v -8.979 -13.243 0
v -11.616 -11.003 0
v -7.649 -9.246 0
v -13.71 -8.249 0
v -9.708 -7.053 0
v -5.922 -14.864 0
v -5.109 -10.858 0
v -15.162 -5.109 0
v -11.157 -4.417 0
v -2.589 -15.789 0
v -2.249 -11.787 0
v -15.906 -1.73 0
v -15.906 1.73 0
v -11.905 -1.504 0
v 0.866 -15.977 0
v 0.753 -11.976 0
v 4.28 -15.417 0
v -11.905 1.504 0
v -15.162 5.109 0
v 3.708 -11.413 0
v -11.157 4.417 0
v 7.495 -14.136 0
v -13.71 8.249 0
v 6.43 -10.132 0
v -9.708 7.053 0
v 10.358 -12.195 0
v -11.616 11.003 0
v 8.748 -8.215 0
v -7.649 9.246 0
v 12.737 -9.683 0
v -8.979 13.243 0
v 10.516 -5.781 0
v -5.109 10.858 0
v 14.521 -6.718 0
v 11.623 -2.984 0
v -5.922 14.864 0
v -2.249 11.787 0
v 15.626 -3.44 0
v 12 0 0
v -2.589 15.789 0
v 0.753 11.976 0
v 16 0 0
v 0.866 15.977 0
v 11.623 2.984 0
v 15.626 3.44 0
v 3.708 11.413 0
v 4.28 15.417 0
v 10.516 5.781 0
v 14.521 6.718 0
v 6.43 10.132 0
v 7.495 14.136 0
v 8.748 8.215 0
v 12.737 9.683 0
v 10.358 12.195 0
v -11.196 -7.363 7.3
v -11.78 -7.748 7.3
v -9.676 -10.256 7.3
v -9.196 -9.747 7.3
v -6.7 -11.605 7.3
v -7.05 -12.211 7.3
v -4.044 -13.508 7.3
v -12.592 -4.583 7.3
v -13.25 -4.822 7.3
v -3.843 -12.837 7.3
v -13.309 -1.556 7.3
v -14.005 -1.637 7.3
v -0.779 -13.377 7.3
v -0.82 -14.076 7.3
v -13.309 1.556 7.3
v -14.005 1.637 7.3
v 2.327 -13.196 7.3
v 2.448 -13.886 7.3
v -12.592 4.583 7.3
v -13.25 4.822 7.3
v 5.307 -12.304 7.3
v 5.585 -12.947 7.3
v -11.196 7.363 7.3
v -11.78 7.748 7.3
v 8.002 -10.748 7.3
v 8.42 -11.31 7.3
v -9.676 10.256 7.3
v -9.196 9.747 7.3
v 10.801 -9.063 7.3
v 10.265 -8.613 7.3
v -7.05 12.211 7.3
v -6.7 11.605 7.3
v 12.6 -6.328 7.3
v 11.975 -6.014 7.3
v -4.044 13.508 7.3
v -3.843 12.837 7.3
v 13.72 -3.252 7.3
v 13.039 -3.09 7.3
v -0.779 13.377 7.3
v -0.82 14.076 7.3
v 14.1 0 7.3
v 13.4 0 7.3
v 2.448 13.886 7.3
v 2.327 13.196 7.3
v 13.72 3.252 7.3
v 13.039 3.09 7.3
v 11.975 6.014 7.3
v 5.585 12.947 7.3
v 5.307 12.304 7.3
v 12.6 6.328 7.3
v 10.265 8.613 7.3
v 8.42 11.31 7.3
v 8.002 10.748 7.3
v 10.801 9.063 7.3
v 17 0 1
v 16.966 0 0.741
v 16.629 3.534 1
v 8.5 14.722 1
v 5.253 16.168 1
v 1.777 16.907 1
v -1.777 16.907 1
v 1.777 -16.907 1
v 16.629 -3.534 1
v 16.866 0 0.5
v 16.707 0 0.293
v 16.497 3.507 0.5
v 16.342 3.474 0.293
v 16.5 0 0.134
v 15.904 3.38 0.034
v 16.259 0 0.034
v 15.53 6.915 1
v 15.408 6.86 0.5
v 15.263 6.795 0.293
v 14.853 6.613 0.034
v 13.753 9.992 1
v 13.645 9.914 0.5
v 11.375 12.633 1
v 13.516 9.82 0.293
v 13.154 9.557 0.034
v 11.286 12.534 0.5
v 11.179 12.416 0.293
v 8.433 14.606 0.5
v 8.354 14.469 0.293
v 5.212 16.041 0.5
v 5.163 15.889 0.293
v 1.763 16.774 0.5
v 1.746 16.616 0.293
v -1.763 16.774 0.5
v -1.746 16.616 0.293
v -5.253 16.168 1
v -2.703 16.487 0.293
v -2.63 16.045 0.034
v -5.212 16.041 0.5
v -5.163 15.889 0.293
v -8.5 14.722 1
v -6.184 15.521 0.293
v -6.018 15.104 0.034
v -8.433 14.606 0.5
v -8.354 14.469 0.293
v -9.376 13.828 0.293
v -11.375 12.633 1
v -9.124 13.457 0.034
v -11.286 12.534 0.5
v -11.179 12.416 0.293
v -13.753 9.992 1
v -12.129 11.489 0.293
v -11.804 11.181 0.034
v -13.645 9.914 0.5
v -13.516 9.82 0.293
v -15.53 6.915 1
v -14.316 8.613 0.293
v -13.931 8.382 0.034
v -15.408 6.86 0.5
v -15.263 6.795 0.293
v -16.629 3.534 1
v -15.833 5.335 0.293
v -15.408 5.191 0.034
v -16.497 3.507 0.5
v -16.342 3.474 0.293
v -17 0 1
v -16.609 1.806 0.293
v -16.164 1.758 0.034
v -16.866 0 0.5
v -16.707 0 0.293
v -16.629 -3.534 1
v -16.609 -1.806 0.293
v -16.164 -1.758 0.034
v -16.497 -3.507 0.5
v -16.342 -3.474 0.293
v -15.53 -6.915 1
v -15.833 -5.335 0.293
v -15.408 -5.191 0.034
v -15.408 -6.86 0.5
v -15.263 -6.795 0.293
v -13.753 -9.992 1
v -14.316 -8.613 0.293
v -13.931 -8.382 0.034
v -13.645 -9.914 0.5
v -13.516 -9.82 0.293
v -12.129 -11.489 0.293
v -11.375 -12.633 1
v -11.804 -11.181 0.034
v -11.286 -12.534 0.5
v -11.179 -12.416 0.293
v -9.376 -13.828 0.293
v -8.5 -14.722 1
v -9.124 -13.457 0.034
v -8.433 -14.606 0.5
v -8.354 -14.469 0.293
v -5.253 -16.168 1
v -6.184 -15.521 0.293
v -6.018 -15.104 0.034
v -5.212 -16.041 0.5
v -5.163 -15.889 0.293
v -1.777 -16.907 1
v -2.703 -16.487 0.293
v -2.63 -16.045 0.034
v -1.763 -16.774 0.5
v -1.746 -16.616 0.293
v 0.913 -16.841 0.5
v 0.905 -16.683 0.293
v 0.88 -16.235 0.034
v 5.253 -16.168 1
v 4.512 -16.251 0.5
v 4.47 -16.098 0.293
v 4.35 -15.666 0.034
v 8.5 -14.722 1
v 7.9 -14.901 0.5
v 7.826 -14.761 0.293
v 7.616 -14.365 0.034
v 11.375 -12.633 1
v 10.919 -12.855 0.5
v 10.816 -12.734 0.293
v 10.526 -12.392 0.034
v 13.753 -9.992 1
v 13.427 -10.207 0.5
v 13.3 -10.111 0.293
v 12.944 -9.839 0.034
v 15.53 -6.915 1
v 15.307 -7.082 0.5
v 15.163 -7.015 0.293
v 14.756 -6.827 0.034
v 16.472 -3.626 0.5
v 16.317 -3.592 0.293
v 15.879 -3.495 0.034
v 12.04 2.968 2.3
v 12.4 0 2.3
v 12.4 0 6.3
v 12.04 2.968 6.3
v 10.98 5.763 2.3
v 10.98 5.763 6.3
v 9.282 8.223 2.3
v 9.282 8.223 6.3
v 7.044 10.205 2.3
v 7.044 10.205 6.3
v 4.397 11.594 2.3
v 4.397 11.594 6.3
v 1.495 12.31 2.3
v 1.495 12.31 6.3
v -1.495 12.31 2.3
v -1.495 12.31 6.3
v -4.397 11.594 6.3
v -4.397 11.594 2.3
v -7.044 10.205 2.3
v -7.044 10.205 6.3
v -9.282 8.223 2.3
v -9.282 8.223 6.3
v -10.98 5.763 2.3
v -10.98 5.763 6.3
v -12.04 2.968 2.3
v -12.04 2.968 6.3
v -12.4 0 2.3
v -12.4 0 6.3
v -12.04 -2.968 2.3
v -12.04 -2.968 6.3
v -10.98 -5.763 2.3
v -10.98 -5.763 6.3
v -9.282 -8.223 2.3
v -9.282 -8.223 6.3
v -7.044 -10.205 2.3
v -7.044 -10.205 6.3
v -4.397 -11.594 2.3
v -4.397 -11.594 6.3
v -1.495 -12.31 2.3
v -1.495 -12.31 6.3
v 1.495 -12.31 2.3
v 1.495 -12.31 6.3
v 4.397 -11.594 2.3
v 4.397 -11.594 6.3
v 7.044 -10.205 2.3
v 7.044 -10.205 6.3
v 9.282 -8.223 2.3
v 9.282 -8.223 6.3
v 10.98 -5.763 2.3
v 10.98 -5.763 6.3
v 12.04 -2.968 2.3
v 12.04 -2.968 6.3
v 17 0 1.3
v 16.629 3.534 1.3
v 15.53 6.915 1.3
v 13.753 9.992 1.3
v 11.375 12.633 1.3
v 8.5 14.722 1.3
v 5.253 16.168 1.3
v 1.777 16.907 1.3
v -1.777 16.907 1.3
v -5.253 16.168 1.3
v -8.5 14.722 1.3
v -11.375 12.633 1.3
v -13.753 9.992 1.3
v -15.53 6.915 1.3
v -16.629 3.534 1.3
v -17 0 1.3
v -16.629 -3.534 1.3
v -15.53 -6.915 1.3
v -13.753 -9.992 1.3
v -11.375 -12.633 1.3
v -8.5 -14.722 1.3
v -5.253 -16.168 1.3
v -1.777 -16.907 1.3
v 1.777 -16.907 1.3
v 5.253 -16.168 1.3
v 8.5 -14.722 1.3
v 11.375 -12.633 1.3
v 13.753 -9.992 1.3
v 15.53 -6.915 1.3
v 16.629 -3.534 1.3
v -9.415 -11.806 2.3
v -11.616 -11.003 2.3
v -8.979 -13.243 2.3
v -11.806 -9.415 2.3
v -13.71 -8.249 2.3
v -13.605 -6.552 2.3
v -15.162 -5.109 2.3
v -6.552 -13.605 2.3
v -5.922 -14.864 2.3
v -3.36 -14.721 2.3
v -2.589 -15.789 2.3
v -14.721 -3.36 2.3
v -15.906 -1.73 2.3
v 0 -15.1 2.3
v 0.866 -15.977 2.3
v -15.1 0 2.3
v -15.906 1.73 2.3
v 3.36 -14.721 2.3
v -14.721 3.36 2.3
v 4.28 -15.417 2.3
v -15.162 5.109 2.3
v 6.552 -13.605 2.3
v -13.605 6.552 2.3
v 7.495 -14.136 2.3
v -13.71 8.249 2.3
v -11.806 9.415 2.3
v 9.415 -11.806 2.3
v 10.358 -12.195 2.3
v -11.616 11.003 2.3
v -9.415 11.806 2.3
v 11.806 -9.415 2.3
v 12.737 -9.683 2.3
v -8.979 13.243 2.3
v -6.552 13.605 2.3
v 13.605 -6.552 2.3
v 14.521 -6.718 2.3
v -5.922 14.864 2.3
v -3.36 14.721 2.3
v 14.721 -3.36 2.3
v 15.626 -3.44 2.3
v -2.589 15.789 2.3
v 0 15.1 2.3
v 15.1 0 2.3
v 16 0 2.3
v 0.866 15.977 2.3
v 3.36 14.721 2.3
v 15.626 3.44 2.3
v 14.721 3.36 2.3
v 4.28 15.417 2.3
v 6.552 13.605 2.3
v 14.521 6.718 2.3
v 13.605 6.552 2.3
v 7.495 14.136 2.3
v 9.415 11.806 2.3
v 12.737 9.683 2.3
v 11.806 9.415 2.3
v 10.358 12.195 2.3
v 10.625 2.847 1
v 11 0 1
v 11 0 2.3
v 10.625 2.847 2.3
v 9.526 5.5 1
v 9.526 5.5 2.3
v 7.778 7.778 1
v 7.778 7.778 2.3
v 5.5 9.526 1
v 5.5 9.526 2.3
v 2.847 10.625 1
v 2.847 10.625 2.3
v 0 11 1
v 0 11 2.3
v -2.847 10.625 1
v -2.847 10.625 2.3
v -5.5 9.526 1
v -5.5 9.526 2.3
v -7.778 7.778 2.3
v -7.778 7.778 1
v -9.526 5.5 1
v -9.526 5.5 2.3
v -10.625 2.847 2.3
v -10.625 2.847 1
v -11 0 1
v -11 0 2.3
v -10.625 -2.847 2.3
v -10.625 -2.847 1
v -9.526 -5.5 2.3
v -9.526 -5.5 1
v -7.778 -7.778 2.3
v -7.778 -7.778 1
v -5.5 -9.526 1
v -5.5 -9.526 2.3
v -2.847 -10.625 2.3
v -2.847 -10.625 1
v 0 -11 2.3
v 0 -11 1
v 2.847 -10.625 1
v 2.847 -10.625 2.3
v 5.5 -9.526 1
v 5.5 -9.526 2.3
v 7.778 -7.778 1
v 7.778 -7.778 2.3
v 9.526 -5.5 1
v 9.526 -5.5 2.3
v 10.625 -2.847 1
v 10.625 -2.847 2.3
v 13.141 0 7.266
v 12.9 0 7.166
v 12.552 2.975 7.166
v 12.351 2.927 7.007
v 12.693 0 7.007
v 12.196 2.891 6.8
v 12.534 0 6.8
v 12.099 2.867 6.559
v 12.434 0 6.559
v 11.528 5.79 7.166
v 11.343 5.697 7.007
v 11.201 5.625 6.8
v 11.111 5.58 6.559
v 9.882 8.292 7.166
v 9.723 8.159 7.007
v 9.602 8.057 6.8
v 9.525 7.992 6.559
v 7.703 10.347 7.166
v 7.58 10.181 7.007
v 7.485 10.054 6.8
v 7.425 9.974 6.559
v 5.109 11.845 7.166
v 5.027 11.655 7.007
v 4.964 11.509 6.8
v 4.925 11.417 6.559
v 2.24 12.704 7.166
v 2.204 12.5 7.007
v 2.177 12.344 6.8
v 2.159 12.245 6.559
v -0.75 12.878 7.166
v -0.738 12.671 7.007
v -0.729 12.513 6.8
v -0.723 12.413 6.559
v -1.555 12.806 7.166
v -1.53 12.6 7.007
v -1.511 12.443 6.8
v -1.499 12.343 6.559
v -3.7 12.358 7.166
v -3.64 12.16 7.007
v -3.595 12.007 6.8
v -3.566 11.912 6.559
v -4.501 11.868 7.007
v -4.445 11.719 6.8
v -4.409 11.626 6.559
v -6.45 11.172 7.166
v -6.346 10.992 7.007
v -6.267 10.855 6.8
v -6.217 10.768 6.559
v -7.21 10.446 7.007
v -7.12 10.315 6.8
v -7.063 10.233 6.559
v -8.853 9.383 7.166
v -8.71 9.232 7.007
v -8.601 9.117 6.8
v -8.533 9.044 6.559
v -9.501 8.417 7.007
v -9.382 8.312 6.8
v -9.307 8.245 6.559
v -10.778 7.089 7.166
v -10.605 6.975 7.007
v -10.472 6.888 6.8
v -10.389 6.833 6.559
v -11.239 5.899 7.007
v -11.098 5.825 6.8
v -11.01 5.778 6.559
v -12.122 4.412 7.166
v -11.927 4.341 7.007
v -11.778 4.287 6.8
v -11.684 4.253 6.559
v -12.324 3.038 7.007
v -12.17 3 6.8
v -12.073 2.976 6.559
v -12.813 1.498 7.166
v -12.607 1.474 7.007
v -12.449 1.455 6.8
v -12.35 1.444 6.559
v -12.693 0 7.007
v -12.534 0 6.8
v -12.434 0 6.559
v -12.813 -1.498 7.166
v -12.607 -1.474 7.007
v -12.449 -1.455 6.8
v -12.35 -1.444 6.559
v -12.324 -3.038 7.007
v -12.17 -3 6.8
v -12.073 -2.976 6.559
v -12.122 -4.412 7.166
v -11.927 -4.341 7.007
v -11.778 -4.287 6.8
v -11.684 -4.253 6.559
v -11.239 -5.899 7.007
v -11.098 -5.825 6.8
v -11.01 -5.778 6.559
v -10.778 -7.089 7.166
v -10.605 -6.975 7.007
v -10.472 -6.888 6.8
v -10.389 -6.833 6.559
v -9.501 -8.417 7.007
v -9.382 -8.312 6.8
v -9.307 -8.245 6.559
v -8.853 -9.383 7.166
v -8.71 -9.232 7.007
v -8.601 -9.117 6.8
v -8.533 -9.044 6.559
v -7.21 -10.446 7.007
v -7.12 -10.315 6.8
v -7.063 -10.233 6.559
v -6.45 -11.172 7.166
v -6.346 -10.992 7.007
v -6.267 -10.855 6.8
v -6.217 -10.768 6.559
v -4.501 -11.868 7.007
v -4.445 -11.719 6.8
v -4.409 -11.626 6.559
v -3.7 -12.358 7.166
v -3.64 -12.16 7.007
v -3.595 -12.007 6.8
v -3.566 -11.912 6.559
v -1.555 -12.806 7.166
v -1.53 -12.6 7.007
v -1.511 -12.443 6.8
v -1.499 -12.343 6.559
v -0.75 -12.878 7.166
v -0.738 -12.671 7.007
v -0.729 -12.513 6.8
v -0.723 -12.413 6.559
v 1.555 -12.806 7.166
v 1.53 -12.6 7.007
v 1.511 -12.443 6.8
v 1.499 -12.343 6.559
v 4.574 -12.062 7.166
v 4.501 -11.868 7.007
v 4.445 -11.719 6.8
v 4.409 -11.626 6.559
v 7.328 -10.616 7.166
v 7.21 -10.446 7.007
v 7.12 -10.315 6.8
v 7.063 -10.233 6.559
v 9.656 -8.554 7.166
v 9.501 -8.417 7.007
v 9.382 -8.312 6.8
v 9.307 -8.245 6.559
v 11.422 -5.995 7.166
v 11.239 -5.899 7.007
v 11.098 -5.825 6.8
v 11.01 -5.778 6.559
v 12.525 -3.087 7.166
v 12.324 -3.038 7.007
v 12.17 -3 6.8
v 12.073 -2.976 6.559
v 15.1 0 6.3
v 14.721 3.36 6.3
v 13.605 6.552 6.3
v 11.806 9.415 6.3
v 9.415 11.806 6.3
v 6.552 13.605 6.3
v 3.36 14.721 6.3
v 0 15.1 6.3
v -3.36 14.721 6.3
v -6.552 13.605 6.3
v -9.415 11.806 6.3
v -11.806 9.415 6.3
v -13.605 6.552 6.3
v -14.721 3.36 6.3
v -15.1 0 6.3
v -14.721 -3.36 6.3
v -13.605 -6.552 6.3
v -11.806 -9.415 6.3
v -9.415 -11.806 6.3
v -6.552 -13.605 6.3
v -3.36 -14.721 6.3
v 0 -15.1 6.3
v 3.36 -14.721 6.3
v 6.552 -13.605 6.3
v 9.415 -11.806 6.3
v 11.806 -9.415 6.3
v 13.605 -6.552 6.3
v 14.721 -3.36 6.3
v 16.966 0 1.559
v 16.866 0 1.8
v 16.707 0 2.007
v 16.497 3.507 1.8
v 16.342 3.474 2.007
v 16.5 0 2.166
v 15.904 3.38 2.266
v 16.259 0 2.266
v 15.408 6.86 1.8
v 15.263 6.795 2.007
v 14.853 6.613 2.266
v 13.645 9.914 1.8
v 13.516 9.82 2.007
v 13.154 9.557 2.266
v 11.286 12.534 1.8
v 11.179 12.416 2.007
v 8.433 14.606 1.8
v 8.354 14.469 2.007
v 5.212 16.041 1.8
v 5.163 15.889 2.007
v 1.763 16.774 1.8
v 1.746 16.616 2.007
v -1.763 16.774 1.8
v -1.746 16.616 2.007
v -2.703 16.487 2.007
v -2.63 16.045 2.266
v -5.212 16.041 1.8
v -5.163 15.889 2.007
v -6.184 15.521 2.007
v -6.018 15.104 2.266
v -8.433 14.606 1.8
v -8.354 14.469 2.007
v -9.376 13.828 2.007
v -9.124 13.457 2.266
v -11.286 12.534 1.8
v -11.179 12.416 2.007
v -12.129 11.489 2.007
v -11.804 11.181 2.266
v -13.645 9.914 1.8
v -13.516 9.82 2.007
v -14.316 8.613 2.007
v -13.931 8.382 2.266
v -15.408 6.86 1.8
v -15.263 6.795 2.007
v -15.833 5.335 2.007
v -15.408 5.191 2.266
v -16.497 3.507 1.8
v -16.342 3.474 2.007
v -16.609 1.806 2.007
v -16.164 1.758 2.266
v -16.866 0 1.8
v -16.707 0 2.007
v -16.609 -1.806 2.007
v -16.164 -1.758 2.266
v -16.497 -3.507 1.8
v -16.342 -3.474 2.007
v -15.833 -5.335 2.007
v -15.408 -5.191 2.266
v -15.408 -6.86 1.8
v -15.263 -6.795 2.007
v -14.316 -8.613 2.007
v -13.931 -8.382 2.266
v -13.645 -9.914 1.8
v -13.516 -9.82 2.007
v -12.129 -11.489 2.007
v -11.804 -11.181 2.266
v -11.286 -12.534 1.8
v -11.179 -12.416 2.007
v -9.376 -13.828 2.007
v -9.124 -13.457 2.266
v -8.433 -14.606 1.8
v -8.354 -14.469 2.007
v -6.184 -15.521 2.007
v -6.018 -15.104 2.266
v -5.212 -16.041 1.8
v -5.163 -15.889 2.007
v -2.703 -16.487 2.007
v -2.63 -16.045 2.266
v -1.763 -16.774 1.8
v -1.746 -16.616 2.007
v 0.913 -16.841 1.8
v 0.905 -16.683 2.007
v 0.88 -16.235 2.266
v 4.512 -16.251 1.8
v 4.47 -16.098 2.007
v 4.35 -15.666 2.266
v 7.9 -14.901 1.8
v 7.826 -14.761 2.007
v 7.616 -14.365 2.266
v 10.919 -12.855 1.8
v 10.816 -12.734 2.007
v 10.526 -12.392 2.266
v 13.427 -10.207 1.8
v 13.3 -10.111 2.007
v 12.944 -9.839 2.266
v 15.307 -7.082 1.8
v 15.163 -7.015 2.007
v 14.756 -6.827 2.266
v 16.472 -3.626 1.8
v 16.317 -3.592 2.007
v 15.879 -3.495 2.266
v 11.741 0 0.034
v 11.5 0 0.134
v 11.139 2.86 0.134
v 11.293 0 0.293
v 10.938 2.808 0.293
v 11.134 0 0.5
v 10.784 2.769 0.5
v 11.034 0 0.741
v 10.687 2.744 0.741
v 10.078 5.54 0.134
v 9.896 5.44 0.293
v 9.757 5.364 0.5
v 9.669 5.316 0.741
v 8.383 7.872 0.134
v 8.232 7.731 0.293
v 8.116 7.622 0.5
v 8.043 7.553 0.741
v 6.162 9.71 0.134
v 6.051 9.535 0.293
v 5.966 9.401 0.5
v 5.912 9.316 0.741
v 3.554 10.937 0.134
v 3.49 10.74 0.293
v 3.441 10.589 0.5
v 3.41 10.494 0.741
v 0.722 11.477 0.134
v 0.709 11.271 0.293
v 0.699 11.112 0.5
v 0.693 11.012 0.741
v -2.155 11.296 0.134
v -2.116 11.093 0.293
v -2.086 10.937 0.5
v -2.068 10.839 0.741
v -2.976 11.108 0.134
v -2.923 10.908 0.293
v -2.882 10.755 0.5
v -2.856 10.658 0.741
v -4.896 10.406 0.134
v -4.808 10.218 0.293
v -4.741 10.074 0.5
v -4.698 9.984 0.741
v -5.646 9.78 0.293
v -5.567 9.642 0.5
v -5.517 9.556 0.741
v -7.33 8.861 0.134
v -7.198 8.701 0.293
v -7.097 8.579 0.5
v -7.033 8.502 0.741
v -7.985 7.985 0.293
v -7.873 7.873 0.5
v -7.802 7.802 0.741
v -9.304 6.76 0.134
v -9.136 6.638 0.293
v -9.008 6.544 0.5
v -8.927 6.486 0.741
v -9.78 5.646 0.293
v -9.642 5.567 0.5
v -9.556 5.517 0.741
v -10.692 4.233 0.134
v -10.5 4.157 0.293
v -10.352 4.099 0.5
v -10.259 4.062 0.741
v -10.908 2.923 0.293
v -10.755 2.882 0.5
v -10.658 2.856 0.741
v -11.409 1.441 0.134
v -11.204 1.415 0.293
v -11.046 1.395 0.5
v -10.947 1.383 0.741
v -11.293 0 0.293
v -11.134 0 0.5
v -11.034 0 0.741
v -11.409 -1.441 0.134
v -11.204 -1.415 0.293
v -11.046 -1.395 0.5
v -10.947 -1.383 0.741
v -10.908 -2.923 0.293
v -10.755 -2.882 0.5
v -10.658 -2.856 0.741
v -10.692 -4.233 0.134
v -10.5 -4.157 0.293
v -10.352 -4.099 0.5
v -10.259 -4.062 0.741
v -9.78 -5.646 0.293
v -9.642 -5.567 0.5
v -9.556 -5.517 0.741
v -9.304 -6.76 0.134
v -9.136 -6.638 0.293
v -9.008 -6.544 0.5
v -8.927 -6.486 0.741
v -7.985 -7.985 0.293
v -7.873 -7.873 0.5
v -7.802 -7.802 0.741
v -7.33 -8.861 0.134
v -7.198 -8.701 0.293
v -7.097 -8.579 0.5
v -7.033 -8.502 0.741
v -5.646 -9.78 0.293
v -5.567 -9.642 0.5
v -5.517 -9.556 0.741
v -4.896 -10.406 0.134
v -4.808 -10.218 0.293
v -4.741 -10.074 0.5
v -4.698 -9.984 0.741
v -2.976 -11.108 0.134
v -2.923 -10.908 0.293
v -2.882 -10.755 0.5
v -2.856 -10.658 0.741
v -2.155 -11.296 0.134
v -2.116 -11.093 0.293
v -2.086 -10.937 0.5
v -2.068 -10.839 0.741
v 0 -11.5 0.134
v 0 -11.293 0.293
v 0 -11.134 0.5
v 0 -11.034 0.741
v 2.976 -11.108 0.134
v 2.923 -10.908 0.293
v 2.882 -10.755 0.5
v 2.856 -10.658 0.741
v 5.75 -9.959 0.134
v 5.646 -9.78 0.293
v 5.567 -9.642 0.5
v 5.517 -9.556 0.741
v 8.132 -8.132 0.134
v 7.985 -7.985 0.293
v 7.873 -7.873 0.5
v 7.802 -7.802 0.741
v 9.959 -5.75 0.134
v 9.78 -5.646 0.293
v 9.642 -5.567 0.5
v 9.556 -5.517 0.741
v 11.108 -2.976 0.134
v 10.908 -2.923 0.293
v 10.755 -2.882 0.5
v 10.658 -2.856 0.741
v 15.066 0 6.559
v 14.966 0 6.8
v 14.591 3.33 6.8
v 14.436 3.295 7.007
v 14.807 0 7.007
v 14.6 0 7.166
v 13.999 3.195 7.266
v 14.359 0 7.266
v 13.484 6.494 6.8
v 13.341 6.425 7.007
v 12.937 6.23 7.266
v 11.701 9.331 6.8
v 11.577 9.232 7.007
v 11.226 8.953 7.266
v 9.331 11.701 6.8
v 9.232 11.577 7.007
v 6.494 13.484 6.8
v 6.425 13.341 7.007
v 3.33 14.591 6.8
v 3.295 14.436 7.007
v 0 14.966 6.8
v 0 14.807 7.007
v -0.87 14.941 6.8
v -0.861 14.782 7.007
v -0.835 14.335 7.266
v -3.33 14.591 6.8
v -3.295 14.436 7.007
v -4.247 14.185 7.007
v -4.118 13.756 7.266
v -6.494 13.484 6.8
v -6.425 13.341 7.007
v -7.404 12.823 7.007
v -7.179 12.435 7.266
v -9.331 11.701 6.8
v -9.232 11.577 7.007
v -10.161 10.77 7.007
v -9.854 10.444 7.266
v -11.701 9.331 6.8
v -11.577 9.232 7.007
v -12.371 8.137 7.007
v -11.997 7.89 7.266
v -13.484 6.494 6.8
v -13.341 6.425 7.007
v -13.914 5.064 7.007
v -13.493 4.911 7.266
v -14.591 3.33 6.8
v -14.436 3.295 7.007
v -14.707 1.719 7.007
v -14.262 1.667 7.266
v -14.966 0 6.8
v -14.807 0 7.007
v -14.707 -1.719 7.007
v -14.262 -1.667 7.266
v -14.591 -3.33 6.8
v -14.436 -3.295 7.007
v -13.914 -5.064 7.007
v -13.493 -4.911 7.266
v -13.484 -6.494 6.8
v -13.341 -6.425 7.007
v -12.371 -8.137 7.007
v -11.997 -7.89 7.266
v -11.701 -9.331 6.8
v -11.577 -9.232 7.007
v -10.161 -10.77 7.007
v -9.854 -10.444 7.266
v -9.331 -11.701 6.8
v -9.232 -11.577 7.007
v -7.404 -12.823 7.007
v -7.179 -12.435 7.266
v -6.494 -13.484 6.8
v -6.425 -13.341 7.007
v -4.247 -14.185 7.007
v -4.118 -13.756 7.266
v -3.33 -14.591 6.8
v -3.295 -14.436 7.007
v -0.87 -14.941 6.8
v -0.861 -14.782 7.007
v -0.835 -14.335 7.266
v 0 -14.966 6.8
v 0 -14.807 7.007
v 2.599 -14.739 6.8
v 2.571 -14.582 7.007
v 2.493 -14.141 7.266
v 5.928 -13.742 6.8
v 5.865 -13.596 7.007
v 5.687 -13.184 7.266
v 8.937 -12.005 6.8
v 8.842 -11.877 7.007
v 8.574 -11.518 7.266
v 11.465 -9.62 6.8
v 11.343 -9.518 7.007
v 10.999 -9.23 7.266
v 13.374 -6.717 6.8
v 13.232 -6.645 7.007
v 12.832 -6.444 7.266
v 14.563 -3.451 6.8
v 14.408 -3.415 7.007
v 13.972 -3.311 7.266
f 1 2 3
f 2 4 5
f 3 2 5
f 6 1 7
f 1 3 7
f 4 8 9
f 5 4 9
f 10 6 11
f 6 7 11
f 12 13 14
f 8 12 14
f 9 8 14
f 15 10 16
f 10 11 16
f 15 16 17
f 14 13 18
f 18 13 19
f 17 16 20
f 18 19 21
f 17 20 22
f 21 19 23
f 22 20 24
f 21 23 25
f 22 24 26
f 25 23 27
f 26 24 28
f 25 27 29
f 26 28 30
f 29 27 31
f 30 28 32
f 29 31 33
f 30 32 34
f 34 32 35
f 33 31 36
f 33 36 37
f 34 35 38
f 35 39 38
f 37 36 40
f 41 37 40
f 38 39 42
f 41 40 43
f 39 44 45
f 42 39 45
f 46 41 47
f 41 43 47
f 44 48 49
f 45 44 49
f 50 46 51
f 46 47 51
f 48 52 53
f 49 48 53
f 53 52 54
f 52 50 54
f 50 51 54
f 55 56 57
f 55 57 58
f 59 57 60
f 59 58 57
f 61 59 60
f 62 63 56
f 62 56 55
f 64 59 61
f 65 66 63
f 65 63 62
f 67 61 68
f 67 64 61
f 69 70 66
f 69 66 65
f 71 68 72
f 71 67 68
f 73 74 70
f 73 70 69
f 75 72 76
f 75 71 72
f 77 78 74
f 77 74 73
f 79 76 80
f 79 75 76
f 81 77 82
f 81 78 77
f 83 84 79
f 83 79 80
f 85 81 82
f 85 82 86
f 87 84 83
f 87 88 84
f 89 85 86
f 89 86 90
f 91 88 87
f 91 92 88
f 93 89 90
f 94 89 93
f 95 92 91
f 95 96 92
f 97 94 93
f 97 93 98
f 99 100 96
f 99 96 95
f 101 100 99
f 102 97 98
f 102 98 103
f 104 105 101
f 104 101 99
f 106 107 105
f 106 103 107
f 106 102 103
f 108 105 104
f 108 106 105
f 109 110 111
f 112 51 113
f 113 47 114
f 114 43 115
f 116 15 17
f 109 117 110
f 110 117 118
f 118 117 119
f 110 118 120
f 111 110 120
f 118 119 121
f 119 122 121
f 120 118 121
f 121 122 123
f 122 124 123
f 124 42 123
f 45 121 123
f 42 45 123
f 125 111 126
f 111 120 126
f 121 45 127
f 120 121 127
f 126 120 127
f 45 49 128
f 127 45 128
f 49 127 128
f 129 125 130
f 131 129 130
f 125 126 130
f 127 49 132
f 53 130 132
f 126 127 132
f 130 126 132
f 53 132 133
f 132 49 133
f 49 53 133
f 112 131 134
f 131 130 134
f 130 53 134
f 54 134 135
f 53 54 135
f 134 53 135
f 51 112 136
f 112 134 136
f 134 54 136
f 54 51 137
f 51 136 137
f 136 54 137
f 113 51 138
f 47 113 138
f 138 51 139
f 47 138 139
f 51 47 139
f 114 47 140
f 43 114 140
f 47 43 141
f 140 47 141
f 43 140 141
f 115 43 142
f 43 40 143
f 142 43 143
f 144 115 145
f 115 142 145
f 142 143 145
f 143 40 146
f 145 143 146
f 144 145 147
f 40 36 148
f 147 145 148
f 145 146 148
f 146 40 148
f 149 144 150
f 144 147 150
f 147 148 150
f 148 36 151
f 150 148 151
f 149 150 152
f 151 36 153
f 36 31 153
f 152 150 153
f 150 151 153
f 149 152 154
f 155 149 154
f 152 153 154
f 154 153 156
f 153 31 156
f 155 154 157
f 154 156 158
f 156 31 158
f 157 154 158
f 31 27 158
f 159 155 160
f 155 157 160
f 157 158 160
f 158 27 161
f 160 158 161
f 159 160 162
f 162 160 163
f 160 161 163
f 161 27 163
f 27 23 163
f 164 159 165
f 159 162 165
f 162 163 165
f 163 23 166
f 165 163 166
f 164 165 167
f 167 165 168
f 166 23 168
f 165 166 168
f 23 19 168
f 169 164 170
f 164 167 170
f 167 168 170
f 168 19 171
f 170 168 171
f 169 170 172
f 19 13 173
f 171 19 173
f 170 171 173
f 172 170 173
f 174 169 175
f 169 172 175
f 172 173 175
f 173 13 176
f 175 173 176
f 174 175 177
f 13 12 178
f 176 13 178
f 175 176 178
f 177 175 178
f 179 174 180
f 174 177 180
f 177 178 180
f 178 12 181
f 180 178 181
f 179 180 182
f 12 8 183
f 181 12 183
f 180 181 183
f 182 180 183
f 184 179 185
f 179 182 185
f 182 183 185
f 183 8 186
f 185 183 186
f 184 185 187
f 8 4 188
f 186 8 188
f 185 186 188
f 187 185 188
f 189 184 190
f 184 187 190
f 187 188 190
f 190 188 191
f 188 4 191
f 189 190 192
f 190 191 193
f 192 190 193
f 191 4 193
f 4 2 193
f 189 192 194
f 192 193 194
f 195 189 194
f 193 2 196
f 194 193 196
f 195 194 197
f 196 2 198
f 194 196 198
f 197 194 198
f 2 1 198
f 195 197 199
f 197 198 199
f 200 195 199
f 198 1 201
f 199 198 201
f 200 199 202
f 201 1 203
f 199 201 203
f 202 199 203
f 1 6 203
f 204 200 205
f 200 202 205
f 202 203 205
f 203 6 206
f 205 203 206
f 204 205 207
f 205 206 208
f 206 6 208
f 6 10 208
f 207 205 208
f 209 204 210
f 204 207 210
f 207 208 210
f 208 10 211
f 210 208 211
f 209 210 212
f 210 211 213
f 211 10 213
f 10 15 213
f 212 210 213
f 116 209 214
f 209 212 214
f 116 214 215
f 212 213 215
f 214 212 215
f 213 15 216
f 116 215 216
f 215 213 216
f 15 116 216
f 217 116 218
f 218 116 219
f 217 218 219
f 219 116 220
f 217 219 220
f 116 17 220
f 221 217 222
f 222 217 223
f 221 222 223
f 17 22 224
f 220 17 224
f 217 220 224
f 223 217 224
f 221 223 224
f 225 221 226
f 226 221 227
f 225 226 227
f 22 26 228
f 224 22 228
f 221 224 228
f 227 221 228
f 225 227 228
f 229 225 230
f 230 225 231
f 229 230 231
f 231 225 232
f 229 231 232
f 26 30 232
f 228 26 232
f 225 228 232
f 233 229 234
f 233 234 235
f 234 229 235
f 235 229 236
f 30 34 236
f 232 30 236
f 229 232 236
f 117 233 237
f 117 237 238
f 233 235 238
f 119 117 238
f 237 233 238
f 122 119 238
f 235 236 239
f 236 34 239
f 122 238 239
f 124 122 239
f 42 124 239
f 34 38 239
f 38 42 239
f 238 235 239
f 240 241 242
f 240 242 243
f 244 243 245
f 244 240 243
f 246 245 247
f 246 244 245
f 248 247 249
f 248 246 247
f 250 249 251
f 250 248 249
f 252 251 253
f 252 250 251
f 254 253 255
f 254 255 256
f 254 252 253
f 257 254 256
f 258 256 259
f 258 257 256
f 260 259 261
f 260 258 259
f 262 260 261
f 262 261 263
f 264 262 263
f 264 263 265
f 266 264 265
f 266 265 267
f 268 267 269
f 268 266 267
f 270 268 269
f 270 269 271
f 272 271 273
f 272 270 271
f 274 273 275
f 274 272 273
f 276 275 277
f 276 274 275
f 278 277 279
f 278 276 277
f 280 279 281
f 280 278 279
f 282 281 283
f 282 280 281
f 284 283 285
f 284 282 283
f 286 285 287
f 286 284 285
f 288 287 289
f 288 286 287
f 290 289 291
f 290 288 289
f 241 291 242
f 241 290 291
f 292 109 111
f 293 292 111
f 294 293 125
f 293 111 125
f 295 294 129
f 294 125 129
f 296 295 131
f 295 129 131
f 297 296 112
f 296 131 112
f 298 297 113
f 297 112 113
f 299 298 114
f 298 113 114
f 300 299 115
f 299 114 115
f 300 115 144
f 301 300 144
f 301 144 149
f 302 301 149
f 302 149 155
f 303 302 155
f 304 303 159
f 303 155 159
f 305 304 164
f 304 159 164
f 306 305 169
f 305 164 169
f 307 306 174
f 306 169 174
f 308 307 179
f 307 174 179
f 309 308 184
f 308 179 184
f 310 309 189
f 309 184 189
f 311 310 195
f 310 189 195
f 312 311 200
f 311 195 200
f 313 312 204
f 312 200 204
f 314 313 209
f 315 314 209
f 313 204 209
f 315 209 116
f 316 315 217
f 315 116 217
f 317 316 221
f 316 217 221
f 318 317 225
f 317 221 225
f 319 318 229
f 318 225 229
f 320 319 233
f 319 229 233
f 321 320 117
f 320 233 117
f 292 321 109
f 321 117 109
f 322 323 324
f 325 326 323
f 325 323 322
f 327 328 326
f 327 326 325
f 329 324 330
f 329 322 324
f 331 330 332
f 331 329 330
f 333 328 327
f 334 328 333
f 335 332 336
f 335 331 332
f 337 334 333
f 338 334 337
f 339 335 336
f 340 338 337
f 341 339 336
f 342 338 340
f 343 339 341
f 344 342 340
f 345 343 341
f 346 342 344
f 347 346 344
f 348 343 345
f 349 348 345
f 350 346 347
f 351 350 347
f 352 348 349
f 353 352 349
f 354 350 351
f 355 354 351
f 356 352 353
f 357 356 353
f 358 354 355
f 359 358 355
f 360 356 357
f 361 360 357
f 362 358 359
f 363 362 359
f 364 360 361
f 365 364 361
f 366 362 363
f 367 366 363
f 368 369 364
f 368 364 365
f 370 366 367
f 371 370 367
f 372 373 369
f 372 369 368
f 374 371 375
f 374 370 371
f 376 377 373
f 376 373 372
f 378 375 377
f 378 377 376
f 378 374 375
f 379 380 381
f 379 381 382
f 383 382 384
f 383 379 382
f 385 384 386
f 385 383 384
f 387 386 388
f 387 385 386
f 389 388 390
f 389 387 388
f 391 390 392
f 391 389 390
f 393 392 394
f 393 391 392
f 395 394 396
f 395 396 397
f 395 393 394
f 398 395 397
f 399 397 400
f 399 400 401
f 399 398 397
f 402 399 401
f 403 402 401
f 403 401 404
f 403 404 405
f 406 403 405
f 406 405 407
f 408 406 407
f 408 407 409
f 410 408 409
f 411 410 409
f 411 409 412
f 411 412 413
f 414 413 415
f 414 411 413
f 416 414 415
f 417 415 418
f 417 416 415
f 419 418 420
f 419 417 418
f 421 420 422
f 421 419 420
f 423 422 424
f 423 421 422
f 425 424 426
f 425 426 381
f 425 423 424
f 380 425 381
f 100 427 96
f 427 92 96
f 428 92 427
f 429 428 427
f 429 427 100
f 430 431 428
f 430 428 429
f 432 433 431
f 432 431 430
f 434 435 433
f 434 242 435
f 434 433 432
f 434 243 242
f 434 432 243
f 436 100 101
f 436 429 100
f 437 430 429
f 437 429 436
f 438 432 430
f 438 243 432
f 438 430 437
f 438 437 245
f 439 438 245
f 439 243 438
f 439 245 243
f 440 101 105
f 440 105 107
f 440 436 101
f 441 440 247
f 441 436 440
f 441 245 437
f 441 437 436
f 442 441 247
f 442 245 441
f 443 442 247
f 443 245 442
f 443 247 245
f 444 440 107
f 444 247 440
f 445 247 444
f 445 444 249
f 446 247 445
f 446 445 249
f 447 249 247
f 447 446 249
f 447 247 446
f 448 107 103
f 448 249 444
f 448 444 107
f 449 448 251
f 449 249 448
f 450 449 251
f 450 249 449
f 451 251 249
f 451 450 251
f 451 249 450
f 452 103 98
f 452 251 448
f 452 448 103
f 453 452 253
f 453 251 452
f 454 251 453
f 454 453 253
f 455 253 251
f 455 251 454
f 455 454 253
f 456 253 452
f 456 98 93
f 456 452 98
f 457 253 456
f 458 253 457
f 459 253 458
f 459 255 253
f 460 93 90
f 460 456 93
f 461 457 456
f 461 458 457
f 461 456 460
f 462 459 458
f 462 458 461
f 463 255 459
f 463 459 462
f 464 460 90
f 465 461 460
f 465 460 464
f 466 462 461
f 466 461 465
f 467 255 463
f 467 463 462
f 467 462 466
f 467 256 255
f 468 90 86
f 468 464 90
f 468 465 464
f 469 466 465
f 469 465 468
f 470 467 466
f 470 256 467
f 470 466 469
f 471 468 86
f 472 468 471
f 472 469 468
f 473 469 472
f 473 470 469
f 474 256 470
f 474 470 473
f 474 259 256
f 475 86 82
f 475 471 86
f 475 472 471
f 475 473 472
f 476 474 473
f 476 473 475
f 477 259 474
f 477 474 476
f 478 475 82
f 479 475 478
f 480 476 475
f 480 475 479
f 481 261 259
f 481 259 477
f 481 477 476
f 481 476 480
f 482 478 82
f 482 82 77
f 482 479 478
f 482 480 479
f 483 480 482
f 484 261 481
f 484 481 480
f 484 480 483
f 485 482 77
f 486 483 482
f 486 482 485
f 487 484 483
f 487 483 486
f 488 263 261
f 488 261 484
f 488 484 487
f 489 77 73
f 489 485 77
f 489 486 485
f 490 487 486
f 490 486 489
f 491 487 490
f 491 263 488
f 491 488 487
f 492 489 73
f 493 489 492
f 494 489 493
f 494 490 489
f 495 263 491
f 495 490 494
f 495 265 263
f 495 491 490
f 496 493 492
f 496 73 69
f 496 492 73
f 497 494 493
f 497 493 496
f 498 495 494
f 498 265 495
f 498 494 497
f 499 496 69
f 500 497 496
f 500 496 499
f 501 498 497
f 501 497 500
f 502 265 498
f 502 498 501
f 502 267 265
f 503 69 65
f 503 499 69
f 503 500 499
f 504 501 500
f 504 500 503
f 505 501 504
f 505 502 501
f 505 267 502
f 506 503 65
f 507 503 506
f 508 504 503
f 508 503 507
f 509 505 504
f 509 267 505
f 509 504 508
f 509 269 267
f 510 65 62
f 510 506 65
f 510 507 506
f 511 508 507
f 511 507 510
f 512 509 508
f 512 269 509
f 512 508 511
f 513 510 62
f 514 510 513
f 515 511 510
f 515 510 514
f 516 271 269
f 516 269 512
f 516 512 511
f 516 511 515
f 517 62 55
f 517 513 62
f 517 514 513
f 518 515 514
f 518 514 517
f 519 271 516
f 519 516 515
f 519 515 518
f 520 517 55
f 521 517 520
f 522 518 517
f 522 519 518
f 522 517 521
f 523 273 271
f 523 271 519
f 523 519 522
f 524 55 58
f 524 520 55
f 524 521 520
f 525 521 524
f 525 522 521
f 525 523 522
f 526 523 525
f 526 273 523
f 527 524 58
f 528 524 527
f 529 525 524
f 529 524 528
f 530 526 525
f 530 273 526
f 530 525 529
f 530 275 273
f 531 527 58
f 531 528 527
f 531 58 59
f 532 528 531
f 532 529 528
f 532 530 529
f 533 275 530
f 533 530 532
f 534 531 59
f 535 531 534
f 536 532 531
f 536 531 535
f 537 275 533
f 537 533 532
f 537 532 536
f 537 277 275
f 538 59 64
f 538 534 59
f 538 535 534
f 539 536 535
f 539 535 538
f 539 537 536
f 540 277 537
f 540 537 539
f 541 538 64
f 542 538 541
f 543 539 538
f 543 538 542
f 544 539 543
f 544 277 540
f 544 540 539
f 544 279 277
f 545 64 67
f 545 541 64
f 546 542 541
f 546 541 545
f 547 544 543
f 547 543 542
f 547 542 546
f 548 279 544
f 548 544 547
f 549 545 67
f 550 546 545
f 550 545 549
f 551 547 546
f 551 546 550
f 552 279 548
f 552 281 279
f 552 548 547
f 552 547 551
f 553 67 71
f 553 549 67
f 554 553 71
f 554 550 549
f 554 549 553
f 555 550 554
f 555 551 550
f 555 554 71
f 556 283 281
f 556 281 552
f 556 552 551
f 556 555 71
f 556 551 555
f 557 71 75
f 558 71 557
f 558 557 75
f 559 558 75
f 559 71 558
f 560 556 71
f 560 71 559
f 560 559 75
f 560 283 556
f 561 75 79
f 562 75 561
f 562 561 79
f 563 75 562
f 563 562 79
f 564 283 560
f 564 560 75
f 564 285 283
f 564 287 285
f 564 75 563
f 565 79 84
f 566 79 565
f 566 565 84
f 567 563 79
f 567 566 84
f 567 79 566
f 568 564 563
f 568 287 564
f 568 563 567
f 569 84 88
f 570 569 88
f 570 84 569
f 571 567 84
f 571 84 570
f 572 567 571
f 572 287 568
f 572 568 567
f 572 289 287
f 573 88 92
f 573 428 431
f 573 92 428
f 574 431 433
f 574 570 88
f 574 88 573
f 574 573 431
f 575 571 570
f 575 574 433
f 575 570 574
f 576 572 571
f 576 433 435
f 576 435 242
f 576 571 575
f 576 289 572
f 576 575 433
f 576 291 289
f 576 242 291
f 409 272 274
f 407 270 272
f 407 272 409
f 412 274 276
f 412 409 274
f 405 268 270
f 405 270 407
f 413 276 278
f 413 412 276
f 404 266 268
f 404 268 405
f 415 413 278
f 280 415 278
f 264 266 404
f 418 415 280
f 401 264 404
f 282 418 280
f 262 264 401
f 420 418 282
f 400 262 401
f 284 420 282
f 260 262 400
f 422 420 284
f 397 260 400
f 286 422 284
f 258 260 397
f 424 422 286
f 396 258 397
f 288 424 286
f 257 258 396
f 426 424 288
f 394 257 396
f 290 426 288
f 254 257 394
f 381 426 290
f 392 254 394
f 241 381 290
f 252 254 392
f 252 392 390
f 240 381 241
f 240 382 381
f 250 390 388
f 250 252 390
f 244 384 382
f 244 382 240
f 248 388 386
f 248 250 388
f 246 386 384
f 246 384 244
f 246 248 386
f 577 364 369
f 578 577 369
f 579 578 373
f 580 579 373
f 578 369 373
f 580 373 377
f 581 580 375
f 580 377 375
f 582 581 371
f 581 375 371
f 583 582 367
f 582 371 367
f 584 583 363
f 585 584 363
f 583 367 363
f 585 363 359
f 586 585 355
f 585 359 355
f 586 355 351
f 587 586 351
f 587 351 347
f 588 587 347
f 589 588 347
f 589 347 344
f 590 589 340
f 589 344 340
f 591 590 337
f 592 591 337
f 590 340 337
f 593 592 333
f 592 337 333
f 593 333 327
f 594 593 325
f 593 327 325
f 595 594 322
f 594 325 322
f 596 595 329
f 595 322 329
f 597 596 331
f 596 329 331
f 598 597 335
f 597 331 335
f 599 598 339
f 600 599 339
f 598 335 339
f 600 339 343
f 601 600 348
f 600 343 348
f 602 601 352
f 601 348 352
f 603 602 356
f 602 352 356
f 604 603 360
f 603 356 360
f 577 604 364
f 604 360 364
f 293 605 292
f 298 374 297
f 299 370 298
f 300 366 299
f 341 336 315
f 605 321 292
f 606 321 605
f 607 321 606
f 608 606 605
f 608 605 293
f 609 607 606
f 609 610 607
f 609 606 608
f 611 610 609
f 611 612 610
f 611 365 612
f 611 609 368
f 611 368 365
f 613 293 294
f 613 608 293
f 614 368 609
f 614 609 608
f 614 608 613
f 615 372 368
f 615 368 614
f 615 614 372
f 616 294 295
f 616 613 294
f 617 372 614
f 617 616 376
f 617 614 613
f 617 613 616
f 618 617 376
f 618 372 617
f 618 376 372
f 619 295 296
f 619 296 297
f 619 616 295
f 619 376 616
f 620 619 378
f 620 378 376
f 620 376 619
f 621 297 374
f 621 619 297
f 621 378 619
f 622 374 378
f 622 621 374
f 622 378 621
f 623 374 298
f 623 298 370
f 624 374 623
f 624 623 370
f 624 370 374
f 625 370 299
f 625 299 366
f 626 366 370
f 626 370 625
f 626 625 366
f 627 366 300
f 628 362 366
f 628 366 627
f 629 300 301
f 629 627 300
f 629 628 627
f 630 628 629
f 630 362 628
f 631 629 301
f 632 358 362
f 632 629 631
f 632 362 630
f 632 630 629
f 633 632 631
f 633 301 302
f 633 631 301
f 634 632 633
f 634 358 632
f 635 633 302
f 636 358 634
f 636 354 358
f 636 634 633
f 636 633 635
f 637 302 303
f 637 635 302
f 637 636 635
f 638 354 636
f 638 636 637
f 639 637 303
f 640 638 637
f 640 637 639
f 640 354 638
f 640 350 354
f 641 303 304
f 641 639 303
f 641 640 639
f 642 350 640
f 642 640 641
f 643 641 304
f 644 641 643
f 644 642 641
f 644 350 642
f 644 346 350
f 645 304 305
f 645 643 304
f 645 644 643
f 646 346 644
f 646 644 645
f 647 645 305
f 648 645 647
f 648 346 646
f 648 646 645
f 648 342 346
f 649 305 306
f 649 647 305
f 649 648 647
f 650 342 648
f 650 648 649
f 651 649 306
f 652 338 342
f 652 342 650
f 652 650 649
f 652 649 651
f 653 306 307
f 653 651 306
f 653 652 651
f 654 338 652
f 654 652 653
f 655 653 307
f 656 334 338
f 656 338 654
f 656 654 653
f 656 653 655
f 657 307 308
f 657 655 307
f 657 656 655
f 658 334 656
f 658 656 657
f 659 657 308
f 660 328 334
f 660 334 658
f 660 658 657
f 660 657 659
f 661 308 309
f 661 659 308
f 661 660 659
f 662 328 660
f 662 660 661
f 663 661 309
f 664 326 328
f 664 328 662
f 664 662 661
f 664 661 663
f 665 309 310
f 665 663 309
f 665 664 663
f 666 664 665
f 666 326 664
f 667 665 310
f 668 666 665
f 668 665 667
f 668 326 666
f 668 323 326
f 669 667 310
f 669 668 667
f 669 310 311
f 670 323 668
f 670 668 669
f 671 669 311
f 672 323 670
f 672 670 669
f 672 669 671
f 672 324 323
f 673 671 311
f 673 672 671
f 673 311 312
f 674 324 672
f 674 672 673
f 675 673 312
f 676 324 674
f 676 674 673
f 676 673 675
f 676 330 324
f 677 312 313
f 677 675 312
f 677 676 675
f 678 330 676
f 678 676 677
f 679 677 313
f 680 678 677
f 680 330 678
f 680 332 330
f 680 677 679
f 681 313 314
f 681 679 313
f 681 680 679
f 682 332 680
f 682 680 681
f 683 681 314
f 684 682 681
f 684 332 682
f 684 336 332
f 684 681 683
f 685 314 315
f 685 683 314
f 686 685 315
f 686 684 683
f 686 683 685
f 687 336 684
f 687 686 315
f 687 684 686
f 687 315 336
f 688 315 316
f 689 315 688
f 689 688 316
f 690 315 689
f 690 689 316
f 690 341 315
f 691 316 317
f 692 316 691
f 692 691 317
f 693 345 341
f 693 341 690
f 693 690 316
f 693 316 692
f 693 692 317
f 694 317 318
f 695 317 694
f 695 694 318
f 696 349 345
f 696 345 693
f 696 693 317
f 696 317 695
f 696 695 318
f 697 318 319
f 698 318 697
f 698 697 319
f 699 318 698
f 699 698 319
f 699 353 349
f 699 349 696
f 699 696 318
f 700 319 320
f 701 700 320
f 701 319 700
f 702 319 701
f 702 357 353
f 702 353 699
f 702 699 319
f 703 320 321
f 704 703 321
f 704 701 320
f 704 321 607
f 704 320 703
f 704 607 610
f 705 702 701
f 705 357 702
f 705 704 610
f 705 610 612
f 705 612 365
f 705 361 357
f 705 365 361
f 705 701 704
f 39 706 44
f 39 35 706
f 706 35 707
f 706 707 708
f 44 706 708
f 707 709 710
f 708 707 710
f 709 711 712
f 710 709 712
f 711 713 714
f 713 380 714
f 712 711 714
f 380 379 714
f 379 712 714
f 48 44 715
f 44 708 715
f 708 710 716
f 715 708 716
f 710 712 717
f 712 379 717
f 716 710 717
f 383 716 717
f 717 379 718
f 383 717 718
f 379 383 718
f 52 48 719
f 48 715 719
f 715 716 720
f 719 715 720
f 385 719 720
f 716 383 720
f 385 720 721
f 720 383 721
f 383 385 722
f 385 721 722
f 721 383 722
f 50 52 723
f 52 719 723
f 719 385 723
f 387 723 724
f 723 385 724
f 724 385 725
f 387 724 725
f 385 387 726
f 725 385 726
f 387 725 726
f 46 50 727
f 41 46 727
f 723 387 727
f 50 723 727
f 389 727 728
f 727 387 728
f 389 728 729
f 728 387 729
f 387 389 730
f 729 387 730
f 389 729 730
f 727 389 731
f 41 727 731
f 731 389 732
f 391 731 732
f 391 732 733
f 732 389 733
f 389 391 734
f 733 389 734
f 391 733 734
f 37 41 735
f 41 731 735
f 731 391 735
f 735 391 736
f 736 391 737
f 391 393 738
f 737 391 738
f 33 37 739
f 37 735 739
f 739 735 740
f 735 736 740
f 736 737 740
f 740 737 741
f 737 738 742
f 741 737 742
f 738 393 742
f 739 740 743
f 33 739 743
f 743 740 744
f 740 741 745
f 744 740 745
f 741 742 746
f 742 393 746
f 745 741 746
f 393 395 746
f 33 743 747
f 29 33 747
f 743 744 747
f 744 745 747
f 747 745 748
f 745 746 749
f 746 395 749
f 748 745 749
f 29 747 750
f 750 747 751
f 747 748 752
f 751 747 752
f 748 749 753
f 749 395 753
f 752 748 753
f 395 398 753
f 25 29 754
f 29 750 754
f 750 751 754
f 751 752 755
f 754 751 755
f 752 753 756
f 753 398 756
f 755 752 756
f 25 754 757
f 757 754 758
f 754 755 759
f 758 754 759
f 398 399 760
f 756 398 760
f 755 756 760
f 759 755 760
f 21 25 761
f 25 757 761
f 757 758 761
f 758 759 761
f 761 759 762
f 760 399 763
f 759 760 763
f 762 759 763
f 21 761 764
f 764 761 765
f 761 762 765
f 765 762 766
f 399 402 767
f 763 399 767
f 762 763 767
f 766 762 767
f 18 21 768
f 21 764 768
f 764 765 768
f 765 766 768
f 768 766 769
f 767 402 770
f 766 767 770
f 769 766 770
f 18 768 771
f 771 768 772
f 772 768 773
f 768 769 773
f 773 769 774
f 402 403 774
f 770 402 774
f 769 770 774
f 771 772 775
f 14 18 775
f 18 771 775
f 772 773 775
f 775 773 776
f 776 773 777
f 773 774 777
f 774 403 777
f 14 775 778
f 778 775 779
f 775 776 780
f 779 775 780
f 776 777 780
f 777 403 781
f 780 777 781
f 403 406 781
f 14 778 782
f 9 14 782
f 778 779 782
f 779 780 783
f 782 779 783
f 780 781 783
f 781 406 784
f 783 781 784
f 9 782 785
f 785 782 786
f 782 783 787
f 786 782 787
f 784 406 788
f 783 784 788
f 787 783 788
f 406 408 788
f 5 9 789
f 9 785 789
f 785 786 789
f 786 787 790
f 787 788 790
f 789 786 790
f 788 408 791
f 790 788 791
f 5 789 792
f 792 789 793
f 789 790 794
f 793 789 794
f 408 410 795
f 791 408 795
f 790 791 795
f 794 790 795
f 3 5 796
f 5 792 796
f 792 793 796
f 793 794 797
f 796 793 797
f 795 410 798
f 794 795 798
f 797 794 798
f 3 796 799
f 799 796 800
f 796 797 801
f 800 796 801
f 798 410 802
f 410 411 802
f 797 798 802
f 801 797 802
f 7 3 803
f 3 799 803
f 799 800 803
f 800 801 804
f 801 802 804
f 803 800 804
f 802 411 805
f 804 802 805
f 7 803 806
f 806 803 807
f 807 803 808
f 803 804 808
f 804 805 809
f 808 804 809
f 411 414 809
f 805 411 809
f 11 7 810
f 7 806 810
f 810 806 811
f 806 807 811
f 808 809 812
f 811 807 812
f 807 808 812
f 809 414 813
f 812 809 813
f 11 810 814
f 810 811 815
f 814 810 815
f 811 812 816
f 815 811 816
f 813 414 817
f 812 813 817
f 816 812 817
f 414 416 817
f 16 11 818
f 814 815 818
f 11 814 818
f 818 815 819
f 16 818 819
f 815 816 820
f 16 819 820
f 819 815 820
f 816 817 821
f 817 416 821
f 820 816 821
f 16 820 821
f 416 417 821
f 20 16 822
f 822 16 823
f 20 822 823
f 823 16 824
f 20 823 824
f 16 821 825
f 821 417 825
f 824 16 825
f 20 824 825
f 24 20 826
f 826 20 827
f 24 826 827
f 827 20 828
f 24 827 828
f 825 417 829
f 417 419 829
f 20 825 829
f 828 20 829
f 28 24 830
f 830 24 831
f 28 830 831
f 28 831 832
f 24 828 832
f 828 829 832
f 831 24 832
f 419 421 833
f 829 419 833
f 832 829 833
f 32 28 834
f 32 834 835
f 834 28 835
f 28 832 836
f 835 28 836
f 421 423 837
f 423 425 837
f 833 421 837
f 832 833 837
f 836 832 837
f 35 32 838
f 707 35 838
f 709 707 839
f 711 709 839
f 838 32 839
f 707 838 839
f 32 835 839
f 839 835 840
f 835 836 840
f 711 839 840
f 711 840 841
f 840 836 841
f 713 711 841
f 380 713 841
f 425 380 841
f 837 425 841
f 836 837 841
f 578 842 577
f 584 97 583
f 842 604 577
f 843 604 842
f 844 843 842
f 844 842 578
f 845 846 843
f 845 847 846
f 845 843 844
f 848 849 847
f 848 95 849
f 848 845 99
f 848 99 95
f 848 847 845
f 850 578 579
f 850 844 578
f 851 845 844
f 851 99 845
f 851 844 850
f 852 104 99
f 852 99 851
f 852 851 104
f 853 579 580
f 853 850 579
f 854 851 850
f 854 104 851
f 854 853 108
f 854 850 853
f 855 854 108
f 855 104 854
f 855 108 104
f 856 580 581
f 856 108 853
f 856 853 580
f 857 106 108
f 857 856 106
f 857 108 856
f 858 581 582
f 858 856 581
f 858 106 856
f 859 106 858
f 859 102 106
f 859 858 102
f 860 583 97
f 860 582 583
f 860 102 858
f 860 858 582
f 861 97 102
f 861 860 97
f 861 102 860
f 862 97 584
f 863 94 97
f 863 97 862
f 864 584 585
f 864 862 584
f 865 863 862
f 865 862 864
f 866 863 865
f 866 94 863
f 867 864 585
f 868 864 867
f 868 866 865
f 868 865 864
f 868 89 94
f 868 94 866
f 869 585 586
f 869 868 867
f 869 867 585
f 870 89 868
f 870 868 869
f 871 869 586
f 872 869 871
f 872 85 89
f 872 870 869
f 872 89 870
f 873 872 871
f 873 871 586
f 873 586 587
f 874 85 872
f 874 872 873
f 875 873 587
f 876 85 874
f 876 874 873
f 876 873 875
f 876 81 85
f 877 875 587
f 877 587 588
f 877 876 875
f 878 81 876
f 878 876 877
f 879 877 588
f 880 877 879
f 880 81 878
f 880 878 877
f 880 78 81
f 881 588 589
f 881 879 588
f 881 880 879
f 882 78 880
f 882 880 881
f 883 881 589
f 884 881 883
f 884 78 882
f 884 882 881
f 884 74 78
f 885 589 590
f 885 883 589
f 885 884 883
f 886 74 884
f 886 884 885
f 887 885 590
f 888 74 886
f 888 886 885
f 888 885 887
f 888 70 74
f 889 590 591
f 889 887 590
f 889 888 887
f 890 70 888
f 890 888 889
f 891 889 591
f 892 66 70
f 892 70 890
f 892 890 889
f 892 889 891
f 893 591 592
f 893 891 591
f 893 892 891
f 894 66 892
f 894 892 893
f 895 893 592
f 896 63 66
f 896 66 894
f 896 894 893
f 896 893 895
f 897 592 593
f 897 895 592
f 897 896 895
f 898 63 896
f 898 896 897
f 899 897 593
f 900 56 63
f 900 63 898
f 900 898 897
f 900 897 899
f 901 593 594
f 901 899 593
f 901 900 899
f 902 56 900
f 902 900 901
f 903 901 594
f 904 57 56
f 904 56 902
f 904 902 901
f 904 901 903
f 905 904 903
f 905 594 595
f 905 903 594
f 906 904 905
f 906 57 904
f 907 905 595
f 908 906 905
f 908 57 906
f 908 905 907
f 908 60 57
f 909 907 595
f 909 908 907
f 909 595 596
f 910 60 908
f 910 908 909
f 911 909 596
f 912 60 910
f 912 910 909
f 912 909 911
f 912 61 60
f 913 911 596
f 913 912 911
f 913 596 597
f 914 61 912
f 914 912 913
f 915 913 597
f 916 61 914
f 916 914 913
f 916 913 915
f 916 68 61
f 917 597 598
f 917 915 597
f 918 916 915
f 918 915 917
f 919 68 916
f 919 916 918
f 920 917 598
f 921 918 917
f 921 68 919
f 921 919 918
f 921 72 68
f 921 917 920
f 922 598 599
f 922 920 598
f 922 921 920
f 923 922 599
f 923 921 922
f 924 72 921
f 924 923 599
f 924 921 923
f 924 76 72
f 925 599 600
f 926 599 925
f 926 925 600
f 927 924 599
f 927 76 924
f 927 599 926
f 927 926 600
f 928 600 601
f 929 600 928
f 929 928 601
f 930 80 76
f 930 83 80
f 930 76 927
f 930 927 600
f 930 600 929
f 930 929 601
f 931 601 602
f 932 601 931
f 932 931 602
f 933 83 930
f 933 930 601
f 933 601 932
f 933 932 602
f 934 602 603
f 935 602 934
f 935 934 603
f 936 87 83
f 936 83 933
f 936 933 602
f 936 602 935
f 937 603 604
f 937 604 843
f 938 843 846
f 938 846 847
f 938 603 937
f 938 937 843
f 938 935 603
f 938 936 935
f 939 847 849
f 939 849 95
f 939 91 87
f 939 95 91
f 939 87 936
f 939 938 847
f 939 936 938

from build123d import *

# Parameters (mm, degrees)
F0_R     = 17
F0_R_2   = 11
F1_DEPTH = 2.3
F2_R     = 15.1
F2_R_2   = 12.4
F3_DEPTH = 5
F4_R     = 1


with BuildPart() as f1:
    # F0 (on Top) → F1 (new body)
    with BuildSketch(Plane.XY):
        Circle(F0_R)
        Circle(F0_R_2, mode=Mode.SUBTRACT)
    extrude(amount=F1_DEPTH)

    # F2 (on face) → F3 (join)
    with BuildSketch(Plane.XY.offset(2.3)):
        Circle(F2_R)
        Circle(F2_R_2, mode=Mode.SUBTRACT)
    extrude(amount=F3_DEPTH)

    # F4
    f4_edges = [f1.edges().sort_by_distance(p)[0] for p in [
        (-17, 0, 0),
        (-11, 0, 0),
        (-15.1, 0, 7.3),
        (-12.4, 0, 7.3),
        (-17, 0, 2.3),
    ]]
    fillet(f4_edges, radius=F4_R)


solid = f1.part
